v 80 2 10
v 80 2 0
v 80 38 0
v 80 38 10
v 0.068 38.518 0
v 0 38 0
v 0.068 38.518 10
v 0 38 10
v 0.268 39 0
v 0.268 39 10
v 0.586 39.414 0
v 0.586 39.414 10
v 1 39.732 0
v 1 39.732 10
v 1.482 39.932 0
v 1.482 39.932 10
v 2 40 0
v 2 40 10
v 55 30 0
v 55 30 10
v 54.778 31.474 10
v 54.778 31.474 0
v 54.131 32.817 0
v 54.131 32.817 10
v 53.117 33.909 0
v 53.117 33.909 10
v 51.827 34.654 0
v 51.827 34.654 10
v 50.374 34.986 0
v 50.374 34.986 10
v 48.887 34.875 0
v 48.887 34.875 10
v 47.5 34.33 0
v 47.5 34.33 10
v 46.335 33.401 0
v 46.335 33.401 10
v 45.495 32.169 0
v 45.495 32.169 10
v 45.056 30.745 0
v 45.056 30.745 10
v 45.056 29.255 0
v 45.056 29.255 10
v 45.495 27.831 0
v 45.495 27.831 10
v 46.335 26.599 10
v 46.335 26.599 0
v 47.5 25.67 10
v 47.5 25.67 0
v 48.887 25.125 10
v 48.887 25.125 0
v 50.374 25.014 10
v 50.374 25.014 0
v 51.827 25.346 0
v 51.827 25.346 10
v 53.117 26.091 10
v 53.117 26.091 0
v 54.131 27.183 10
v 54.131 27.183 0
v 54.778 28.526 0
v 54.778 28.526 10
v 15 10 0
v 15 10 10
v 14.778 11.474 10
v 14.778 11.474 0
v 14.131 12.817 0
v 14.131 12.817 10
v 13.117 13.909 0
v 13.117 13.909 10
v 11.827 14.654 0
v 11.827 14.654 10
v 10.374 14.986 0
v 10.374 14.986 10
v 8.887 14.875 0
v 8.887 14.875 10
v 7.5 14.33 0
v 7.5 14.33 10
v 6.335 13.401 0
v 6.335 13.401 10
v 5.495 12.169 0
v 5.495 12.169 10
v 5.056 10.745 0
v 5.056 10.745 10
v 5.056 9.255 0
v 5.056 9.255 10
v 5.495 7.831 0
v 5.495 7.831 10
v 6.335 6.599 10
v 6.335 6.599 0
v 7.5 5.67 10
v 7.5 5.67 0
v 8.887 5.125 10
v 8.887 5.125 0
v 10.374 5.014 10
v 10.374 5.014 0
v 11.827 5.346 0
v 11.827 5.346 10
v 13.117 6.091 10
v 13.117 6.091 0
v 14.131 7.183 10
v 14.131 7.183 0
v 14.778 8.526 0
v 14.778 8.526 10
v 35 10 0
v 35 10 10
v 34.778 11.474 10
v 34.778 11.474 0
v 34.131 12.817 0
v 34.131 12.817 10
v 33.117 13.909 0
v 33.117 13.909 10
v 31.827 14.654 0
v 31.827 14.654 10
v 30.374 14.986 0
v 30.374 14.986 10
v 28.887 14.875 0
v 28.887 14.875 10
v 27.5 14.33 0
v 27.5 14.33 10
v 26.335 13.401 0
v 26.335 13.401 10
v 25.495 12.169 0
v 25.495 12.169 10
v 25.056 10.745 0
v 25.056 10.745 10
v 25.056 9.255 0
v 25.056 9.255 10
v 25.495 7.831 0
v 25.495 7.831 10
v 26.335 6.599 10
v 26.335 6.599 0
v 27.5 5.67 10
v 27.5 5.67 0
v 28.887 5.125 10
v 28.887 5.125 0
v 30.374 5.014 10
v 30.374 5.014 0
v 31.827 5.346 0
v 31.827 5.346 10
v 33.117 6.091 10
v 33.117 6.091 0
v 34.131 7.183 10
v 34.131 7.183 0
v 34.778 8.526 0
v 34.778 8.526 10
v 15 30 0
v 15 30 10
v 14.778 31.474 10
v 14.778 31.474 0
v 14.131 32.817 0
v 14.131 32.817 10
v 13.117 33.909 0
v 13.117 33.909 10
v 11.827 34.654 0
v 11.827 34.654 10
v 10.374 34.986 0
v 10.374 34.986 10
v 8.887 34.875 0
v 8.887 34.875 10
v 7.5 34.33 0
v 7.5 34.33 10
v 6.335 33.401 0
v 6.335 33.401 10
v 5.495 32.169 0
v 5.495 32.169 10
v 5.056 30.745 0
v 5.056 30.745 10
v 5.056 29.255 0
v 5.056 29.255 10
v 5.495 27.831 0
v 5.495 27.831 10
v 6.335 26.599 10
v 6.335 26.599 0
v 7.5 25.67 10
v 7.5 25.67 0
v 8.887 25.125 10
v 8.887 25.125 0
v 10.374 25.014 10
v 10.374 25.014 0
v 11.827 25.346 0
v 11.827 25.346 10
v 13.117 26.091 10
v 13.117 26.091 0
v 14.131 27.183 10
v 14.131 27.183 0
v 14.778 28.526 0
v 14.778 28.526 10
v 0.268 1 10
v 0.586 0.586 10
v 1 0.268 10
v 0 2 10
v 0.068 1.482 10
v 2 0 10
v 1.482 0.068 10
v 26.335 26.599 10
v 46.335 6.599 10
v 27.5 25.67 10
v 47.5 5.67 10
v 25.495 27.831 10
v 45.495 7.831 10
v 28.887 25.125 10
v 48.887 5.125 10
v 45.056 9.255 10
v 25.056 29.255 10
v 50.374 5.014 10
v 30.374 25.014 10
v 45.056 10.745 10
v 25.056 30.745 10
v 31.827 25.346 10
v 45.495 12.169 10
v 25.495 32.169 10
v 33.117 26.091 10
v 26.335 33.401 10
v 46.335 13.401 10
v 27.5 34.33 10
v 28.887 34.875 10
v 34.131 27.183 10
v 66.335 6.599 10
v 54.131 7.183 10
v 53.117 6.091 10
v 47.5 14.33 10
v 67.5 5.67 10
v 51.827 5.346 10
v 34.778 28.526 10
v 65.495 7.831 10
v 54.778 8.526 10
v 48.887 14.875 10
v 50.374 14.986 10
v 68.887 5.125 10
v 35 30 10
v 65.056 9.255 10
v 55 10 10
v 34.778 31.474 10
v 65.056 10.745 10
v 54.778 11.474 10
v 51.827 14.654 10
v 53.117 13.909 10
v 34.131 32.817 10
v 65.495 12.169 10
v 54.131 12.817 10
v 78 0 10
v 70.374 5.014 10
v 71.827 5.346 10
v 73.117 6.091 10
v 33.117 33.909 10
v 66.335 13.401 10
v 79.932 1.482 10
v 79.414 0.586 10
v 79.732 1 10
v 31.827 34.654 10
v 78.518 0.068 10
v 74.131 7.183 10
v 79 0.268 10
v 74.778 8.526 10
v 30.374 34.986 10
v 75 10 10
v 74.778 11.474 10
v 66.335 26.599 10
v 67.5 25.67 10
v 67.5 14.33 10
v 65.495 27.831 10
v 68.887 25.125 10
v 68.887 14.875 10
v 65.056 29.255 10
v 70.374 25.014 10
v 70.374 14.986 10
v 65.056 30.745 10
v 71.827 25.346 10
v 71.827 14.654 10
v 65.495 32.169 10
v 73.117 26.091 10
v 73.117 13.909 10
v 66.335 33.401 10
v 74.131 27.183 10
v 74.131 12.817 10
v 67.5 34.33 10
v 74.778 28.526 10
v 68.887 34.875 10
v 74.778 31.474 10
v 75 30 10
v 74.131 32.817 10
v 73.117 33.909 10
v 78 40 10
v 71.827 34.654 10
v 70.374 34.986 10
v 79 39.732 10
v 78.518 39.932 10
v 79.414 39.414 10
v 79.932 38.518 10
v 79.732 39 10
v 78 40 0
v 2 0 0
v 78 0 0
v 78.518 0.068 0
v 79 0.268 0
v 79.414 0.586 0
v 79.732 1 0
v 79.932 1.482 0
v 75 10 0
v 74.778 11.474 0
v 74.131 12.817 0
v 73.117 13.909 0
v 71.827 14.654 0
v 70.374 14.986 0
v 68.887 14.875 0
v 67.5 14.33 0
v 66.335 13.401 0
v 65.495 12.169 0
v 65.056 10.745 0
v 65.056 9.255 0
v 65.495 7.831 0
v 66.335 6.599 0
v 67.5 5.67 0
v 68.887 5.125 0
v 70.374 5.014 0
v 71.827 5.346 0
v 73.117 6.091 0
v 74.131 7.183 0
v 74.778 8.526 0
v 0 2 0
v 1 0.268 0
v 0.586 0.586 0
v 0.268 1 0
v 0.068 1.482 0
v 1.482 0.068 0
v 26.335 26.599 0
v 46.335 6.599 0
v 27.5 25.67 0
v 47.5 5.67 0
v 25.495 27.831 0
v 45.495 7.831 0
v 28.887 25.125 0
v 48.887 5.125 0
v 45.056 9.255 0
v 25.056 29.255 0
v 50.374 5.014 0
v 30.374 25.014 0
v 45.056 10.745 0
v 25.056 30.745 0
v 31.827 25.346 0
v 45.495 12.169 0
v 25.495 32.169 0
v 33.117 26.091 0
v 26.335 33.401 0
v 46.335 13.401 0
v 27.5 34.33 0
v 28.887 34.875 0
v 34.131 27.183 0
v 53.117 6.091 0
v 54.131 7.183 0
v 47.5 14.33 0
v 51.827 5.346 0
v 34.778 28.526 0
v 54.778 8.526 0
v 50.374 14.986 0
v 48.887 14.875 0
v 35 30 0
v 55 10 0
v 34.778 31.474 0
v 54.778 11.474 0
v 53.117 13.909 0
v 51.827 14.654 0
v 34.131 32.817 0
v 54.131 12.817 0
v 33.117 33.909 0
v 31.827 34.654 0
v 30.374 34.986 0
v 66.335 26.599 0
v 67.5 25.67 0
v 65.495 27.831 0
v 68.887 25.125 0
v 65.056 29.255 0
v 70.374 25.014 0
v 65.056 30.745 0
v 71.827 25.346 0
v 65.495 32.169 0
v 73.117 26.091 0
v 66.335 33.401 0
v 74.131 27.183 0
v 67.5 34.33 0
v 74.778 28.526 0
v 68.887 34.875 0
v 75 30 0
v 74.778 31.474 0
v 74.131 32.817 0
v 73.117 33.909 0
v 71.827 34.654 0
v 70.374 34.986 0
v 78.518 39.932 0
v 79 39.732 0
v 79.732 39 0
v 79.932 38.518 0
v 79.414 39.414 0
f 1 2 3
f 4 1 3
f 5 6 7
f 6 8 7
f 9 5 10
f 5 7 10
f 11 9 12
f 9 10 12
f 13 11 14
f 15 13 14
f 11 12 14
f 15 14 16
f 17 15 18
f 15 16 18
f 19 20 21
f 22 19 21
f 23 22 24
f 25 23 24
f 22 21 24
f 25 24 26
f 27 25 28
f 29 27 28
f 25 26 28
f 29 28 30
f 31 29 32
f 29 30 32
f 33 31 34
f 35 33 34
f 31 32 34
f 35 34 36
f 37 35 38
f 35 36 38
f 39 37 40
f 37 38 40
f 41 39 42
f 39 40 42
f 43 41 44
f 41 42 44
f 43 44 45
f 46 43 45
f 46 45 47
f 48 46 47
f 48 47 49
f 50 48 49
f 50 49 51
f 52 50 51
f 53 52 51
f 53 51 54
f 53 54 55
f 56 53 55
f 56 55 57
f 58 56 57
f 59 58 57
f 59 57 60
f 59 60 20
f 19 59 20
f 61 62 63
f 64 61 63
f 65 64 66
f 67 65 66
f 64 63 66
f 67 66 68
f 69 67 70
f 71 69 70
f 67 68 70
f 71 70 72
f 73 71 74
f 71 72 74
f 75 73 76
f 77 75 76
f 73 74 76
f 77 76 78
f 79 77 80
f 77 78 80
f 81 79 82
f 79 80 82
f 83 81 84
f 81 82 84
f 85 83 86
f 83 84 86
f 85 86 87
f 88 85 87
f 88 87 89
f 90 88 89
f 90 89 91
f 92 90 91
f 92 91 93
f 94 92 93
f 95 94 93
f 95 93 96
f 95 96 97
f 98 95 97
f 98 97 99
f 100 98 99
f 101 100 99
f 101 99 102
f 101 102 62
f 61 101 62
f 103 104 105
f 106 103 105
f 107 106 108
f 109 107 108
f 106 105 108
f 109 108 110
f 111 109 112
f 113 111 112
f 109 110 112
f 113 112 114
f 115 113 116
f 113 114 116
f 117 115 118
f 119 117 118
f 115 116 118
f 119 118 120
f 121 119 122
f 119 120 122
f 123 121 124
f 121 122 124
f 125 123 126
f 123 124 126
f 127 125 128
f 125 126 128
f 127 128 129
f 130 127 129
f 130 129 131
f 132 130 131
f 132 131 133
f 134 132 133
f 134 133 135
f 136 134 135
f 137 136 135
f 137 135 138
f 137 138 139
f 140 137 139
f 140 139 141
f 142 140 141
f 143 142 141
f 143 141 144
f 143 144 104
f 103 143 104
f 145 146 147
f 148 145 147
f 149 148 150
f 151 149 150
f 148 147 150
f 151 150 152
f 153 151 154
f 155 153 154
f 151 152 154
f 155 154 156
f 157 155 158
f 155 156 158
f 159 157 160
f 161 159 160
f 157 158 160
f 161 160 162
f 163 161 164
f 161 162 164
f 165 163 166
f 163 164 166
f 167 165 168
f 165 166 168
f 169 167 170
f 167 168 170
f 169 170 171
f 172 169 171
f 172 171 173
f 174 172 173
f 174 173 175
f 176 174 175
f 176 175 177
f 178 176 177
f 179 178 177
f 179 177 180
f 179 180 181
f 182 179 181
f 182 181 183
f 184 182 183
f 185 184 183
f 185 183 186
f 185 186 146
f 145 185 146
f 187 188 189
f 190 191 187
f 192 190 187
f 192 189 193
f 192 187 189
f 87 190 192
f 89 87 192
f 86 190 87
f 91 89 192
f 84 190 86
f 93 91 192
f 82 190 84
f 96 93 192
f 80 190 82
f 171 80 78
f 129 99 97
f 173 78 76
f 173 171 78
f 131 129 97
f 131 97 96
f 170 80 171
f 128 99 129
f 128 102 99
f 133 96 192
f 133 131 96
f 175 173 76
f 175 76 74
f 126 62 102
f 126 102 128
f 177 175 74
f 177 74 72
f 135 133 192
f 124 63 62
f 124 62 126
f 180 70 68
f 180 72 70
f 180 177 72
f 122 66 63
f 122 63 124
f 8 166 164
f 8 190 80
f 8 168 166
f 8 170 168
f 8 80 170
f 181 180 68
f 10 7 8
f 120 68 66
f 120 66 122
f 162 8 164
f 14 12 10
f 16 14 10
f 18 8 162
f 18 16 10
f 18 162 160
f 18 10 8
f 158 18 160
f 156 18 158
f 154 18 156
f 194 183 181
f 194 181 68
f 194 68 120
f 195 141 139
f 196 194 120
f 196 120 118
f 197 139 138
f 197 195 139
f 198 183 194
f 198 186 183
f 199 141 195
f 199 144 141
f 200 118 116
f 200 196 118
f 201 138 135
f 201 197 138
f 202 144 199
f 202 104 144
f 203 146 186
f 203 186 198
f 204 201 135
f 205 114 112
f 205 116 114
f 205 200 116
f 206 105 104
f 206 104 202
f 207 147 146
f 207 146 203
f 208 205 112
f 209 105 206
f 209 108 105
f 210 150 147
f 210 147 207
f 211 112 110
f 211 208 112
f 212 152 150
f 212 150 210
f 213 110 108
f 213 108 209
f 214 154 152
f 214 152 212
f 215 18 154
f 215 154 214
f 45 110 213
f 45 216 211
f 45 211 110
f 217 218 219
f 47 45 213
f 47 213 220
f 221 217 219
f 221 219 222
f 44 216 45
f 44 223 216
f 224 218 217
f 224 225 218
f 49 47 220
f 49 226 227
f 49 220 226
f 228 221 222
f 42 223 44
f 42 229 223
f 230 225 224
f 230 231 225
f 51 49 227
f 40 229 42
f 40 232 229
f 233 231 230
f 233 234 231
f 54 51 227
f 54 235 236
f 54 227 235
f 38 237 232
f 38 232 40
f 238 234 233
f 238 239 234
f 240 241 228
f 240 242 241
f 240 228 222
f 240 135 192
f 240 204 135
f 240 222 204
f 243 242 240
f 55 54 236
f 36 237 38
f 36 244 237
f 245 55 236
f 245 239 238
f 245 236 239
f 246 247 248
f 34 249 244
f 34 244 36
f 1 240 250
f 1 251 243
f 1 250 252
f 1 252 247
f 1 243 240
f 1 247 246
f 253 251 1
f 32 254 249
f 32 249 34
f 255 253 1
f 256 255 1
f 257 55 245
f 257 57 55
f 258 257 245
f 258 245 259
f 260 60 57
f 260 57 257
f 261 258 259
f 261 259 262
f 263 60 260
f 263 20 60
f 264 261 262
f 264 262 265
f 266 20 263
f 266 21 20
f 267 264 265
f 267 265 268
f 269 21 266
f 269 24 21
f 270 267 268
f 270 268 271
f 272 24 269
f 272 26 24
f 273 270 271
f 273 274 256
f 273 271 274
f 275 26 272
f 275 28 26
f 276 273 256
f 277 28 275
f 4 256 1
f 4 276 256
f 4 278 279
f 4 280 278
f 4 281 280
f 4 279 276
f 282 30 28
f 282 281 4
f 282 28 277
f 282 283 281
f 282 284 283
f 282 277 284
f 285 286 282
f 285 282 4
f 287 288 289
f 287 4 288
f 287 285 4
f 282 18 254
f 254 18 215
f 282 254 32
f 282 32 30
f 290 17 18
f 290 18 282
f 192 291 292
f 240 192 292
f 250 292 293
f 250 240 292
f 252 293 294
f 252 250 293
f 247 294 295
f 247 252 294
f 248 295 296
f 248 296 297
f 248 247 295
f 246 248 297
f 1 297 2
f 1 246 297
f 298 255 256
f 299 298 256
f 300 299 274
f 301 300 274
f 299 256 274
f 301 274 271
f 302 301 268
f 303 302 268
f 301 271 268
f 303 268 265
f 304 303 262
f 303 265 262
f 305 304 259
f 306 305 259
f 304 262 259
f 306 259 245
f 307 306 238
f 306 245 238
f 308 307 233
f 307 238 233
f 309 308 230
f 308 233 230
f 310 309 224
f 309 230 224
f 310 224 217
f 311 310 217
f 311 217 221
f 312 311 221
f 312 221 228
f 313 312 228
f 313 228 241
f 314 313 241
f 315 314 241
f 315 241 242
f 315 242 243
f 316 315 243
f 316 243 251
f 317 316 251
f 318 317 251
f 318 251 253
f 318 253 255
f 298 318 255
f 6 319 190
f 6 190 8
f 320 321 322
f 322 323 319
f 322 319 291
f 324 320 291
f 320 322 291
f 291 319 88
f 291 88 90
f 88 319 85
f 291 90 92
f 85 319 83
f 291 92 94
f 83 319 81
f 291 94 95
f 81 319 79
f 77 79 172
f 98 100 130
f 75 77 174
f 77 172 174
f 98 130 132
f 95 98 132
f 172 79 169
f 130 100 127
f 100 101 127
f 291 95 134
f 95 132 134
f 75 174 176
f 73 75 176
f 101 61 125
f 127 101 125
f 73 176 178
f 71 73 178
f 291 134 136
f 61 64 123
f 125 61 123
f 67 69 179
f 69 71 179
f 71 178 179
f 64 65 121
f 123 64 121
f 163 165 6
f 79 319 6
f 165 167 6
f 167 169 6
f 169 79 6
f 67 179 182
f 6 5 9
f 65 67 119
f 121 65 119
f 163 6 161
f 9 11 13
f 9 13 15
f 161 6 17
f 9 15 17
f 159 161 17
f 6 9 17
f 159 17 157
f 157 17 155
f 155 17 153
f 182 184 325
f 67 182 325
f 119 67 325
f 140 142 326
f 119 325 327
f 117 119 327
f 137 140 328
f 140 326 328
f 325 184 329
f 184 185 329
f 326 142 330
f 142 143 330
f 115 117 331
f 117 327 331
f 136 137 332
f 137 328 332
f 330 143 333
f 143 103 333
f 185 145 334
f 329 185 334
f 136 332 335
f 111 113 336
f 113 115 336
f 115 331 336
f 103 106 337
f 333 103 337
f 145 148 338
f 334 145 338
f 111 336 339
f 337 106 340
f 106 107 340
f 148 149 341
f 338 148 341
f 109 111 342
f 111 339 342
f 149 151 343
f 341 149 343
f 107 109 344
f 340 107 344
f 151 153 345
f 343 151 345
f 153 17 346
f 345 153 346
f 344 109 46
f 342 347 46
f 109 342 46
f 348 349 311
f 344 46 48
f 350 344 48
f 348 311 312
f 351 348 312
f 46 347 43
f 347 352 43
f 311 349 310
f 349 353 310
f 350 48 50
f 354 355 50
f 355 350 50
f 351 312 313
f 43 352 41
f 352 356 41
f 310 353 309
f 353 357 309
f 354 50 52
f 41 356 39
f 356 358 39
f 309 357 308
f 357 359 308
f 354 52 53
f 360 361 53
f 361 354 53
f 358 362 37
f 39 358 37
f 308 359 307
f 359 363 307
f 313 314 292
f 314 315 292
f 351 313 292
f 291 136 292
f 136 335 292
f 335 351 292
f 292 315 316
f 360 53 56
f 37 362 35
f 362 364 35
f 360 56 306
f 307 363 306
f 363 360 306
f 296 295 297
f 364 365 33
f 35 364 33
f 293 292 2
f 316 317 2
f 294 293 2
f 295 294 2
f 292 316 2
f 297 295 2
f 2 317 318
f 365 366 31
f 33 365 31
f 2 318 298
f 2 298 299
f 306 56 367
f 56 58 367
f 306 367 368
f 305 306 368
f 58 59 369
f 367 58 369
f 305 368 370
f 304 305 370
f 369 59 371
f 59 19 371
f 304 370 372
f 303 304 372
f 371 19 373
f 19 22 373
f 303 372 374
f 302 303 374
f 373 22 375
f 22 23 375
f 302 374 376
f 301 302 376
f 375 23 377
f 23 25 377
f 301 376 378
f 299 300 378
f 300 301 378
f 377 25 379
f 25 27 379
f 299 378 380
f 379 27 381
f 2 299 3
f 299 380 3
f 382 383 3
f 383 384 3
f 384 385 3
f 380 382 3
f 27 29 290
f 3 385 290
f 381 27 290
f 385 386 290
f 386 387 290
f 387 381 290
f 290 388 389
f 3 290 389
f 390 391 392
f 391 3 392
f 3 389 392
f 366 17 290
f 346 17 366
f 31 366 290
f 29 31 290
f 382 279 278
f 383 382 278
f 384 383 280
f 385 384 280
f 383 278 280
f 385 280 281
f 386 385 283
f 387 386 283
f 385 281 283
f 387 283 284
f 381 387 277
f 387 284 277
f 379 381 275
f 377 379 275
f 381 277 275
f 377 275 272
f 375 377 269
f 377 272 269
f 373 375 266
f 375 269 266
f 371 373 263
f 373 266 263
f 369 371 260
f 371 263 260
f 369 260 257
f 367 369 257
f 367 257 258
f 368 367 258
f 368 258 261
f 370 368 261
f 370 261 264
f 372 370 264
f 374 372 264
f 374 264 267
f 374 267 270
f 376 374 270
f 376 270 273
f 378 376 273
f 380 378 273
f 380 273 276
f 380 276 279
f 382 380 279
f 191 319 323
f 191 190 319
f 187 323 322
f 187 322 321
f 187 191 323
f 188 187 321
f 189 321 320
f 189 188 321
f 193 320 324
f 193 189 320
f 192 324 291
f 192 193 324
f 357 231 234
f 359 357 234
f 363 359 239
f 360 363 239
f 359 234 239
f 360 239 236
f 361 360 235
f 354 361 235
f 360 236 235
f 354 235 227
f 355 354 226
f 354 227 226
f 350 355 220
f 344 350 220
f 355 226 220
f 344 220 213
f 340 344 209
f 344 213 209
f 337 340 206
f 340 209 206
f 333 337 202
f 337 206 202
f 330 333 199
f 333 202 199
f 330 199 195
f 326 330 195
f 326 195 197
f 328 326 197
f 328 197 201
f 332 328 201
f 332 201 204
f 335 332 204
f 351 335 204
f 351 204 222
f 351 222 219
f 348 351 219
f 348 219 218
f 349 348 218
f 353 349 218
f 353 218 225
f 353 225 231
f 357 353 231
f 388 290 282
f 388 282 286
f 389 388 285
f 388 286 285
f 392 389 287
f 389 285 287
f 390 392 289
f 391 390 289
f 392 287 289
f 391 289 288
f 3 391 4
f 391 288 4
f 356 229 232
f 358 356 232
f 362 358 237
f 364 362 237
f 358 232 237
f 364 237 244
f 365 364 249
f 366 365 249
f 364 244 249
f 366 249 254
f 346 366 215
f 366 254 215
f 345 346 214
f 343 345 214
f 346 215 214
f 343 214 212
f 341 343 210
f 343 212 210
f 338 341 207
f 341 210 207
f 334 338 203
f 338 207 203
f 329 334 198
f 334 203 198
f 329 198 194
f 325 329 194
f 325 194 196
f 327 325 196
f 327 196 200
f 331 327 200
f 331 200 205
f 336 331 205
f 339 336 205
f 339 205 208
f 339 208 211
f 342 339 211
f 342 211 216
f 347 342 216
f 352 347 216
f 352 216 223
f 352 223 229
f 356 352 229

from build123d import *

# Parameters (mm, degrees)
SKETCH2_W            = 80
SKETCH2_H            = 40
BOSS_EXTRUDE2_DEPTH  = 10
SKETCH3_R            = 5
CUT_EXTRUDE1_DEPTH   = 11
LPATTERN2_COUNT      = 4
LPATTERN2_PITCH      = 20
LPATTERN2_COUNT_DIR2 = 2
LPATTERN2_PITCH_DIR2 = 20
FILLET1_R            = 2


with BuildPart() as part:
    # Sketch2 → Boss-Extrude2 (new body)
    with BuildSketch(Plane.XY):
        with Locations((40, 20)):
            Rectangle(SKETCH2_W, SKETCH2_H)
    extrude(amount=BOSS_EXTRUDE2_DEPTH)

    # Sketch3 → Cut-Extrude1 (cut, through all)
    with BuildSketch(Plane.XY.offset(10)):
        with Locations((10, 10)):
            Circle(SKETCH3_R)
    cut_extrude1 = extrude(amount=-CUT_EXTRUDE1_DEPTH, mode=Mode.SUBTRACT)

    # LPattern2: Cut-Extrude1 4 × 2
    with Locations(*[(i * LPATTERN2_PITCH, j * LPATTERN2_PITCH_DIR2, 0) for i in range(LPATTERN2_COUNT) for j in range(LPATTERN2_COUNT_DIR2) if (i, j) != (0, 0)]):
        add(cut_extrude1, mode=Mode.SUBTRACT)

    # Fillet1
    fillet1_edges = [part.edges().sort_by_distance(p)[0] for p in [
        (0, 40, 5),
        (80, 40, 5),
        (80, 0, 5),
        (0, 0, 5),
    ]]
    fillet(fillet1_edges, radius=FILLET1_R)


solid = part.part
